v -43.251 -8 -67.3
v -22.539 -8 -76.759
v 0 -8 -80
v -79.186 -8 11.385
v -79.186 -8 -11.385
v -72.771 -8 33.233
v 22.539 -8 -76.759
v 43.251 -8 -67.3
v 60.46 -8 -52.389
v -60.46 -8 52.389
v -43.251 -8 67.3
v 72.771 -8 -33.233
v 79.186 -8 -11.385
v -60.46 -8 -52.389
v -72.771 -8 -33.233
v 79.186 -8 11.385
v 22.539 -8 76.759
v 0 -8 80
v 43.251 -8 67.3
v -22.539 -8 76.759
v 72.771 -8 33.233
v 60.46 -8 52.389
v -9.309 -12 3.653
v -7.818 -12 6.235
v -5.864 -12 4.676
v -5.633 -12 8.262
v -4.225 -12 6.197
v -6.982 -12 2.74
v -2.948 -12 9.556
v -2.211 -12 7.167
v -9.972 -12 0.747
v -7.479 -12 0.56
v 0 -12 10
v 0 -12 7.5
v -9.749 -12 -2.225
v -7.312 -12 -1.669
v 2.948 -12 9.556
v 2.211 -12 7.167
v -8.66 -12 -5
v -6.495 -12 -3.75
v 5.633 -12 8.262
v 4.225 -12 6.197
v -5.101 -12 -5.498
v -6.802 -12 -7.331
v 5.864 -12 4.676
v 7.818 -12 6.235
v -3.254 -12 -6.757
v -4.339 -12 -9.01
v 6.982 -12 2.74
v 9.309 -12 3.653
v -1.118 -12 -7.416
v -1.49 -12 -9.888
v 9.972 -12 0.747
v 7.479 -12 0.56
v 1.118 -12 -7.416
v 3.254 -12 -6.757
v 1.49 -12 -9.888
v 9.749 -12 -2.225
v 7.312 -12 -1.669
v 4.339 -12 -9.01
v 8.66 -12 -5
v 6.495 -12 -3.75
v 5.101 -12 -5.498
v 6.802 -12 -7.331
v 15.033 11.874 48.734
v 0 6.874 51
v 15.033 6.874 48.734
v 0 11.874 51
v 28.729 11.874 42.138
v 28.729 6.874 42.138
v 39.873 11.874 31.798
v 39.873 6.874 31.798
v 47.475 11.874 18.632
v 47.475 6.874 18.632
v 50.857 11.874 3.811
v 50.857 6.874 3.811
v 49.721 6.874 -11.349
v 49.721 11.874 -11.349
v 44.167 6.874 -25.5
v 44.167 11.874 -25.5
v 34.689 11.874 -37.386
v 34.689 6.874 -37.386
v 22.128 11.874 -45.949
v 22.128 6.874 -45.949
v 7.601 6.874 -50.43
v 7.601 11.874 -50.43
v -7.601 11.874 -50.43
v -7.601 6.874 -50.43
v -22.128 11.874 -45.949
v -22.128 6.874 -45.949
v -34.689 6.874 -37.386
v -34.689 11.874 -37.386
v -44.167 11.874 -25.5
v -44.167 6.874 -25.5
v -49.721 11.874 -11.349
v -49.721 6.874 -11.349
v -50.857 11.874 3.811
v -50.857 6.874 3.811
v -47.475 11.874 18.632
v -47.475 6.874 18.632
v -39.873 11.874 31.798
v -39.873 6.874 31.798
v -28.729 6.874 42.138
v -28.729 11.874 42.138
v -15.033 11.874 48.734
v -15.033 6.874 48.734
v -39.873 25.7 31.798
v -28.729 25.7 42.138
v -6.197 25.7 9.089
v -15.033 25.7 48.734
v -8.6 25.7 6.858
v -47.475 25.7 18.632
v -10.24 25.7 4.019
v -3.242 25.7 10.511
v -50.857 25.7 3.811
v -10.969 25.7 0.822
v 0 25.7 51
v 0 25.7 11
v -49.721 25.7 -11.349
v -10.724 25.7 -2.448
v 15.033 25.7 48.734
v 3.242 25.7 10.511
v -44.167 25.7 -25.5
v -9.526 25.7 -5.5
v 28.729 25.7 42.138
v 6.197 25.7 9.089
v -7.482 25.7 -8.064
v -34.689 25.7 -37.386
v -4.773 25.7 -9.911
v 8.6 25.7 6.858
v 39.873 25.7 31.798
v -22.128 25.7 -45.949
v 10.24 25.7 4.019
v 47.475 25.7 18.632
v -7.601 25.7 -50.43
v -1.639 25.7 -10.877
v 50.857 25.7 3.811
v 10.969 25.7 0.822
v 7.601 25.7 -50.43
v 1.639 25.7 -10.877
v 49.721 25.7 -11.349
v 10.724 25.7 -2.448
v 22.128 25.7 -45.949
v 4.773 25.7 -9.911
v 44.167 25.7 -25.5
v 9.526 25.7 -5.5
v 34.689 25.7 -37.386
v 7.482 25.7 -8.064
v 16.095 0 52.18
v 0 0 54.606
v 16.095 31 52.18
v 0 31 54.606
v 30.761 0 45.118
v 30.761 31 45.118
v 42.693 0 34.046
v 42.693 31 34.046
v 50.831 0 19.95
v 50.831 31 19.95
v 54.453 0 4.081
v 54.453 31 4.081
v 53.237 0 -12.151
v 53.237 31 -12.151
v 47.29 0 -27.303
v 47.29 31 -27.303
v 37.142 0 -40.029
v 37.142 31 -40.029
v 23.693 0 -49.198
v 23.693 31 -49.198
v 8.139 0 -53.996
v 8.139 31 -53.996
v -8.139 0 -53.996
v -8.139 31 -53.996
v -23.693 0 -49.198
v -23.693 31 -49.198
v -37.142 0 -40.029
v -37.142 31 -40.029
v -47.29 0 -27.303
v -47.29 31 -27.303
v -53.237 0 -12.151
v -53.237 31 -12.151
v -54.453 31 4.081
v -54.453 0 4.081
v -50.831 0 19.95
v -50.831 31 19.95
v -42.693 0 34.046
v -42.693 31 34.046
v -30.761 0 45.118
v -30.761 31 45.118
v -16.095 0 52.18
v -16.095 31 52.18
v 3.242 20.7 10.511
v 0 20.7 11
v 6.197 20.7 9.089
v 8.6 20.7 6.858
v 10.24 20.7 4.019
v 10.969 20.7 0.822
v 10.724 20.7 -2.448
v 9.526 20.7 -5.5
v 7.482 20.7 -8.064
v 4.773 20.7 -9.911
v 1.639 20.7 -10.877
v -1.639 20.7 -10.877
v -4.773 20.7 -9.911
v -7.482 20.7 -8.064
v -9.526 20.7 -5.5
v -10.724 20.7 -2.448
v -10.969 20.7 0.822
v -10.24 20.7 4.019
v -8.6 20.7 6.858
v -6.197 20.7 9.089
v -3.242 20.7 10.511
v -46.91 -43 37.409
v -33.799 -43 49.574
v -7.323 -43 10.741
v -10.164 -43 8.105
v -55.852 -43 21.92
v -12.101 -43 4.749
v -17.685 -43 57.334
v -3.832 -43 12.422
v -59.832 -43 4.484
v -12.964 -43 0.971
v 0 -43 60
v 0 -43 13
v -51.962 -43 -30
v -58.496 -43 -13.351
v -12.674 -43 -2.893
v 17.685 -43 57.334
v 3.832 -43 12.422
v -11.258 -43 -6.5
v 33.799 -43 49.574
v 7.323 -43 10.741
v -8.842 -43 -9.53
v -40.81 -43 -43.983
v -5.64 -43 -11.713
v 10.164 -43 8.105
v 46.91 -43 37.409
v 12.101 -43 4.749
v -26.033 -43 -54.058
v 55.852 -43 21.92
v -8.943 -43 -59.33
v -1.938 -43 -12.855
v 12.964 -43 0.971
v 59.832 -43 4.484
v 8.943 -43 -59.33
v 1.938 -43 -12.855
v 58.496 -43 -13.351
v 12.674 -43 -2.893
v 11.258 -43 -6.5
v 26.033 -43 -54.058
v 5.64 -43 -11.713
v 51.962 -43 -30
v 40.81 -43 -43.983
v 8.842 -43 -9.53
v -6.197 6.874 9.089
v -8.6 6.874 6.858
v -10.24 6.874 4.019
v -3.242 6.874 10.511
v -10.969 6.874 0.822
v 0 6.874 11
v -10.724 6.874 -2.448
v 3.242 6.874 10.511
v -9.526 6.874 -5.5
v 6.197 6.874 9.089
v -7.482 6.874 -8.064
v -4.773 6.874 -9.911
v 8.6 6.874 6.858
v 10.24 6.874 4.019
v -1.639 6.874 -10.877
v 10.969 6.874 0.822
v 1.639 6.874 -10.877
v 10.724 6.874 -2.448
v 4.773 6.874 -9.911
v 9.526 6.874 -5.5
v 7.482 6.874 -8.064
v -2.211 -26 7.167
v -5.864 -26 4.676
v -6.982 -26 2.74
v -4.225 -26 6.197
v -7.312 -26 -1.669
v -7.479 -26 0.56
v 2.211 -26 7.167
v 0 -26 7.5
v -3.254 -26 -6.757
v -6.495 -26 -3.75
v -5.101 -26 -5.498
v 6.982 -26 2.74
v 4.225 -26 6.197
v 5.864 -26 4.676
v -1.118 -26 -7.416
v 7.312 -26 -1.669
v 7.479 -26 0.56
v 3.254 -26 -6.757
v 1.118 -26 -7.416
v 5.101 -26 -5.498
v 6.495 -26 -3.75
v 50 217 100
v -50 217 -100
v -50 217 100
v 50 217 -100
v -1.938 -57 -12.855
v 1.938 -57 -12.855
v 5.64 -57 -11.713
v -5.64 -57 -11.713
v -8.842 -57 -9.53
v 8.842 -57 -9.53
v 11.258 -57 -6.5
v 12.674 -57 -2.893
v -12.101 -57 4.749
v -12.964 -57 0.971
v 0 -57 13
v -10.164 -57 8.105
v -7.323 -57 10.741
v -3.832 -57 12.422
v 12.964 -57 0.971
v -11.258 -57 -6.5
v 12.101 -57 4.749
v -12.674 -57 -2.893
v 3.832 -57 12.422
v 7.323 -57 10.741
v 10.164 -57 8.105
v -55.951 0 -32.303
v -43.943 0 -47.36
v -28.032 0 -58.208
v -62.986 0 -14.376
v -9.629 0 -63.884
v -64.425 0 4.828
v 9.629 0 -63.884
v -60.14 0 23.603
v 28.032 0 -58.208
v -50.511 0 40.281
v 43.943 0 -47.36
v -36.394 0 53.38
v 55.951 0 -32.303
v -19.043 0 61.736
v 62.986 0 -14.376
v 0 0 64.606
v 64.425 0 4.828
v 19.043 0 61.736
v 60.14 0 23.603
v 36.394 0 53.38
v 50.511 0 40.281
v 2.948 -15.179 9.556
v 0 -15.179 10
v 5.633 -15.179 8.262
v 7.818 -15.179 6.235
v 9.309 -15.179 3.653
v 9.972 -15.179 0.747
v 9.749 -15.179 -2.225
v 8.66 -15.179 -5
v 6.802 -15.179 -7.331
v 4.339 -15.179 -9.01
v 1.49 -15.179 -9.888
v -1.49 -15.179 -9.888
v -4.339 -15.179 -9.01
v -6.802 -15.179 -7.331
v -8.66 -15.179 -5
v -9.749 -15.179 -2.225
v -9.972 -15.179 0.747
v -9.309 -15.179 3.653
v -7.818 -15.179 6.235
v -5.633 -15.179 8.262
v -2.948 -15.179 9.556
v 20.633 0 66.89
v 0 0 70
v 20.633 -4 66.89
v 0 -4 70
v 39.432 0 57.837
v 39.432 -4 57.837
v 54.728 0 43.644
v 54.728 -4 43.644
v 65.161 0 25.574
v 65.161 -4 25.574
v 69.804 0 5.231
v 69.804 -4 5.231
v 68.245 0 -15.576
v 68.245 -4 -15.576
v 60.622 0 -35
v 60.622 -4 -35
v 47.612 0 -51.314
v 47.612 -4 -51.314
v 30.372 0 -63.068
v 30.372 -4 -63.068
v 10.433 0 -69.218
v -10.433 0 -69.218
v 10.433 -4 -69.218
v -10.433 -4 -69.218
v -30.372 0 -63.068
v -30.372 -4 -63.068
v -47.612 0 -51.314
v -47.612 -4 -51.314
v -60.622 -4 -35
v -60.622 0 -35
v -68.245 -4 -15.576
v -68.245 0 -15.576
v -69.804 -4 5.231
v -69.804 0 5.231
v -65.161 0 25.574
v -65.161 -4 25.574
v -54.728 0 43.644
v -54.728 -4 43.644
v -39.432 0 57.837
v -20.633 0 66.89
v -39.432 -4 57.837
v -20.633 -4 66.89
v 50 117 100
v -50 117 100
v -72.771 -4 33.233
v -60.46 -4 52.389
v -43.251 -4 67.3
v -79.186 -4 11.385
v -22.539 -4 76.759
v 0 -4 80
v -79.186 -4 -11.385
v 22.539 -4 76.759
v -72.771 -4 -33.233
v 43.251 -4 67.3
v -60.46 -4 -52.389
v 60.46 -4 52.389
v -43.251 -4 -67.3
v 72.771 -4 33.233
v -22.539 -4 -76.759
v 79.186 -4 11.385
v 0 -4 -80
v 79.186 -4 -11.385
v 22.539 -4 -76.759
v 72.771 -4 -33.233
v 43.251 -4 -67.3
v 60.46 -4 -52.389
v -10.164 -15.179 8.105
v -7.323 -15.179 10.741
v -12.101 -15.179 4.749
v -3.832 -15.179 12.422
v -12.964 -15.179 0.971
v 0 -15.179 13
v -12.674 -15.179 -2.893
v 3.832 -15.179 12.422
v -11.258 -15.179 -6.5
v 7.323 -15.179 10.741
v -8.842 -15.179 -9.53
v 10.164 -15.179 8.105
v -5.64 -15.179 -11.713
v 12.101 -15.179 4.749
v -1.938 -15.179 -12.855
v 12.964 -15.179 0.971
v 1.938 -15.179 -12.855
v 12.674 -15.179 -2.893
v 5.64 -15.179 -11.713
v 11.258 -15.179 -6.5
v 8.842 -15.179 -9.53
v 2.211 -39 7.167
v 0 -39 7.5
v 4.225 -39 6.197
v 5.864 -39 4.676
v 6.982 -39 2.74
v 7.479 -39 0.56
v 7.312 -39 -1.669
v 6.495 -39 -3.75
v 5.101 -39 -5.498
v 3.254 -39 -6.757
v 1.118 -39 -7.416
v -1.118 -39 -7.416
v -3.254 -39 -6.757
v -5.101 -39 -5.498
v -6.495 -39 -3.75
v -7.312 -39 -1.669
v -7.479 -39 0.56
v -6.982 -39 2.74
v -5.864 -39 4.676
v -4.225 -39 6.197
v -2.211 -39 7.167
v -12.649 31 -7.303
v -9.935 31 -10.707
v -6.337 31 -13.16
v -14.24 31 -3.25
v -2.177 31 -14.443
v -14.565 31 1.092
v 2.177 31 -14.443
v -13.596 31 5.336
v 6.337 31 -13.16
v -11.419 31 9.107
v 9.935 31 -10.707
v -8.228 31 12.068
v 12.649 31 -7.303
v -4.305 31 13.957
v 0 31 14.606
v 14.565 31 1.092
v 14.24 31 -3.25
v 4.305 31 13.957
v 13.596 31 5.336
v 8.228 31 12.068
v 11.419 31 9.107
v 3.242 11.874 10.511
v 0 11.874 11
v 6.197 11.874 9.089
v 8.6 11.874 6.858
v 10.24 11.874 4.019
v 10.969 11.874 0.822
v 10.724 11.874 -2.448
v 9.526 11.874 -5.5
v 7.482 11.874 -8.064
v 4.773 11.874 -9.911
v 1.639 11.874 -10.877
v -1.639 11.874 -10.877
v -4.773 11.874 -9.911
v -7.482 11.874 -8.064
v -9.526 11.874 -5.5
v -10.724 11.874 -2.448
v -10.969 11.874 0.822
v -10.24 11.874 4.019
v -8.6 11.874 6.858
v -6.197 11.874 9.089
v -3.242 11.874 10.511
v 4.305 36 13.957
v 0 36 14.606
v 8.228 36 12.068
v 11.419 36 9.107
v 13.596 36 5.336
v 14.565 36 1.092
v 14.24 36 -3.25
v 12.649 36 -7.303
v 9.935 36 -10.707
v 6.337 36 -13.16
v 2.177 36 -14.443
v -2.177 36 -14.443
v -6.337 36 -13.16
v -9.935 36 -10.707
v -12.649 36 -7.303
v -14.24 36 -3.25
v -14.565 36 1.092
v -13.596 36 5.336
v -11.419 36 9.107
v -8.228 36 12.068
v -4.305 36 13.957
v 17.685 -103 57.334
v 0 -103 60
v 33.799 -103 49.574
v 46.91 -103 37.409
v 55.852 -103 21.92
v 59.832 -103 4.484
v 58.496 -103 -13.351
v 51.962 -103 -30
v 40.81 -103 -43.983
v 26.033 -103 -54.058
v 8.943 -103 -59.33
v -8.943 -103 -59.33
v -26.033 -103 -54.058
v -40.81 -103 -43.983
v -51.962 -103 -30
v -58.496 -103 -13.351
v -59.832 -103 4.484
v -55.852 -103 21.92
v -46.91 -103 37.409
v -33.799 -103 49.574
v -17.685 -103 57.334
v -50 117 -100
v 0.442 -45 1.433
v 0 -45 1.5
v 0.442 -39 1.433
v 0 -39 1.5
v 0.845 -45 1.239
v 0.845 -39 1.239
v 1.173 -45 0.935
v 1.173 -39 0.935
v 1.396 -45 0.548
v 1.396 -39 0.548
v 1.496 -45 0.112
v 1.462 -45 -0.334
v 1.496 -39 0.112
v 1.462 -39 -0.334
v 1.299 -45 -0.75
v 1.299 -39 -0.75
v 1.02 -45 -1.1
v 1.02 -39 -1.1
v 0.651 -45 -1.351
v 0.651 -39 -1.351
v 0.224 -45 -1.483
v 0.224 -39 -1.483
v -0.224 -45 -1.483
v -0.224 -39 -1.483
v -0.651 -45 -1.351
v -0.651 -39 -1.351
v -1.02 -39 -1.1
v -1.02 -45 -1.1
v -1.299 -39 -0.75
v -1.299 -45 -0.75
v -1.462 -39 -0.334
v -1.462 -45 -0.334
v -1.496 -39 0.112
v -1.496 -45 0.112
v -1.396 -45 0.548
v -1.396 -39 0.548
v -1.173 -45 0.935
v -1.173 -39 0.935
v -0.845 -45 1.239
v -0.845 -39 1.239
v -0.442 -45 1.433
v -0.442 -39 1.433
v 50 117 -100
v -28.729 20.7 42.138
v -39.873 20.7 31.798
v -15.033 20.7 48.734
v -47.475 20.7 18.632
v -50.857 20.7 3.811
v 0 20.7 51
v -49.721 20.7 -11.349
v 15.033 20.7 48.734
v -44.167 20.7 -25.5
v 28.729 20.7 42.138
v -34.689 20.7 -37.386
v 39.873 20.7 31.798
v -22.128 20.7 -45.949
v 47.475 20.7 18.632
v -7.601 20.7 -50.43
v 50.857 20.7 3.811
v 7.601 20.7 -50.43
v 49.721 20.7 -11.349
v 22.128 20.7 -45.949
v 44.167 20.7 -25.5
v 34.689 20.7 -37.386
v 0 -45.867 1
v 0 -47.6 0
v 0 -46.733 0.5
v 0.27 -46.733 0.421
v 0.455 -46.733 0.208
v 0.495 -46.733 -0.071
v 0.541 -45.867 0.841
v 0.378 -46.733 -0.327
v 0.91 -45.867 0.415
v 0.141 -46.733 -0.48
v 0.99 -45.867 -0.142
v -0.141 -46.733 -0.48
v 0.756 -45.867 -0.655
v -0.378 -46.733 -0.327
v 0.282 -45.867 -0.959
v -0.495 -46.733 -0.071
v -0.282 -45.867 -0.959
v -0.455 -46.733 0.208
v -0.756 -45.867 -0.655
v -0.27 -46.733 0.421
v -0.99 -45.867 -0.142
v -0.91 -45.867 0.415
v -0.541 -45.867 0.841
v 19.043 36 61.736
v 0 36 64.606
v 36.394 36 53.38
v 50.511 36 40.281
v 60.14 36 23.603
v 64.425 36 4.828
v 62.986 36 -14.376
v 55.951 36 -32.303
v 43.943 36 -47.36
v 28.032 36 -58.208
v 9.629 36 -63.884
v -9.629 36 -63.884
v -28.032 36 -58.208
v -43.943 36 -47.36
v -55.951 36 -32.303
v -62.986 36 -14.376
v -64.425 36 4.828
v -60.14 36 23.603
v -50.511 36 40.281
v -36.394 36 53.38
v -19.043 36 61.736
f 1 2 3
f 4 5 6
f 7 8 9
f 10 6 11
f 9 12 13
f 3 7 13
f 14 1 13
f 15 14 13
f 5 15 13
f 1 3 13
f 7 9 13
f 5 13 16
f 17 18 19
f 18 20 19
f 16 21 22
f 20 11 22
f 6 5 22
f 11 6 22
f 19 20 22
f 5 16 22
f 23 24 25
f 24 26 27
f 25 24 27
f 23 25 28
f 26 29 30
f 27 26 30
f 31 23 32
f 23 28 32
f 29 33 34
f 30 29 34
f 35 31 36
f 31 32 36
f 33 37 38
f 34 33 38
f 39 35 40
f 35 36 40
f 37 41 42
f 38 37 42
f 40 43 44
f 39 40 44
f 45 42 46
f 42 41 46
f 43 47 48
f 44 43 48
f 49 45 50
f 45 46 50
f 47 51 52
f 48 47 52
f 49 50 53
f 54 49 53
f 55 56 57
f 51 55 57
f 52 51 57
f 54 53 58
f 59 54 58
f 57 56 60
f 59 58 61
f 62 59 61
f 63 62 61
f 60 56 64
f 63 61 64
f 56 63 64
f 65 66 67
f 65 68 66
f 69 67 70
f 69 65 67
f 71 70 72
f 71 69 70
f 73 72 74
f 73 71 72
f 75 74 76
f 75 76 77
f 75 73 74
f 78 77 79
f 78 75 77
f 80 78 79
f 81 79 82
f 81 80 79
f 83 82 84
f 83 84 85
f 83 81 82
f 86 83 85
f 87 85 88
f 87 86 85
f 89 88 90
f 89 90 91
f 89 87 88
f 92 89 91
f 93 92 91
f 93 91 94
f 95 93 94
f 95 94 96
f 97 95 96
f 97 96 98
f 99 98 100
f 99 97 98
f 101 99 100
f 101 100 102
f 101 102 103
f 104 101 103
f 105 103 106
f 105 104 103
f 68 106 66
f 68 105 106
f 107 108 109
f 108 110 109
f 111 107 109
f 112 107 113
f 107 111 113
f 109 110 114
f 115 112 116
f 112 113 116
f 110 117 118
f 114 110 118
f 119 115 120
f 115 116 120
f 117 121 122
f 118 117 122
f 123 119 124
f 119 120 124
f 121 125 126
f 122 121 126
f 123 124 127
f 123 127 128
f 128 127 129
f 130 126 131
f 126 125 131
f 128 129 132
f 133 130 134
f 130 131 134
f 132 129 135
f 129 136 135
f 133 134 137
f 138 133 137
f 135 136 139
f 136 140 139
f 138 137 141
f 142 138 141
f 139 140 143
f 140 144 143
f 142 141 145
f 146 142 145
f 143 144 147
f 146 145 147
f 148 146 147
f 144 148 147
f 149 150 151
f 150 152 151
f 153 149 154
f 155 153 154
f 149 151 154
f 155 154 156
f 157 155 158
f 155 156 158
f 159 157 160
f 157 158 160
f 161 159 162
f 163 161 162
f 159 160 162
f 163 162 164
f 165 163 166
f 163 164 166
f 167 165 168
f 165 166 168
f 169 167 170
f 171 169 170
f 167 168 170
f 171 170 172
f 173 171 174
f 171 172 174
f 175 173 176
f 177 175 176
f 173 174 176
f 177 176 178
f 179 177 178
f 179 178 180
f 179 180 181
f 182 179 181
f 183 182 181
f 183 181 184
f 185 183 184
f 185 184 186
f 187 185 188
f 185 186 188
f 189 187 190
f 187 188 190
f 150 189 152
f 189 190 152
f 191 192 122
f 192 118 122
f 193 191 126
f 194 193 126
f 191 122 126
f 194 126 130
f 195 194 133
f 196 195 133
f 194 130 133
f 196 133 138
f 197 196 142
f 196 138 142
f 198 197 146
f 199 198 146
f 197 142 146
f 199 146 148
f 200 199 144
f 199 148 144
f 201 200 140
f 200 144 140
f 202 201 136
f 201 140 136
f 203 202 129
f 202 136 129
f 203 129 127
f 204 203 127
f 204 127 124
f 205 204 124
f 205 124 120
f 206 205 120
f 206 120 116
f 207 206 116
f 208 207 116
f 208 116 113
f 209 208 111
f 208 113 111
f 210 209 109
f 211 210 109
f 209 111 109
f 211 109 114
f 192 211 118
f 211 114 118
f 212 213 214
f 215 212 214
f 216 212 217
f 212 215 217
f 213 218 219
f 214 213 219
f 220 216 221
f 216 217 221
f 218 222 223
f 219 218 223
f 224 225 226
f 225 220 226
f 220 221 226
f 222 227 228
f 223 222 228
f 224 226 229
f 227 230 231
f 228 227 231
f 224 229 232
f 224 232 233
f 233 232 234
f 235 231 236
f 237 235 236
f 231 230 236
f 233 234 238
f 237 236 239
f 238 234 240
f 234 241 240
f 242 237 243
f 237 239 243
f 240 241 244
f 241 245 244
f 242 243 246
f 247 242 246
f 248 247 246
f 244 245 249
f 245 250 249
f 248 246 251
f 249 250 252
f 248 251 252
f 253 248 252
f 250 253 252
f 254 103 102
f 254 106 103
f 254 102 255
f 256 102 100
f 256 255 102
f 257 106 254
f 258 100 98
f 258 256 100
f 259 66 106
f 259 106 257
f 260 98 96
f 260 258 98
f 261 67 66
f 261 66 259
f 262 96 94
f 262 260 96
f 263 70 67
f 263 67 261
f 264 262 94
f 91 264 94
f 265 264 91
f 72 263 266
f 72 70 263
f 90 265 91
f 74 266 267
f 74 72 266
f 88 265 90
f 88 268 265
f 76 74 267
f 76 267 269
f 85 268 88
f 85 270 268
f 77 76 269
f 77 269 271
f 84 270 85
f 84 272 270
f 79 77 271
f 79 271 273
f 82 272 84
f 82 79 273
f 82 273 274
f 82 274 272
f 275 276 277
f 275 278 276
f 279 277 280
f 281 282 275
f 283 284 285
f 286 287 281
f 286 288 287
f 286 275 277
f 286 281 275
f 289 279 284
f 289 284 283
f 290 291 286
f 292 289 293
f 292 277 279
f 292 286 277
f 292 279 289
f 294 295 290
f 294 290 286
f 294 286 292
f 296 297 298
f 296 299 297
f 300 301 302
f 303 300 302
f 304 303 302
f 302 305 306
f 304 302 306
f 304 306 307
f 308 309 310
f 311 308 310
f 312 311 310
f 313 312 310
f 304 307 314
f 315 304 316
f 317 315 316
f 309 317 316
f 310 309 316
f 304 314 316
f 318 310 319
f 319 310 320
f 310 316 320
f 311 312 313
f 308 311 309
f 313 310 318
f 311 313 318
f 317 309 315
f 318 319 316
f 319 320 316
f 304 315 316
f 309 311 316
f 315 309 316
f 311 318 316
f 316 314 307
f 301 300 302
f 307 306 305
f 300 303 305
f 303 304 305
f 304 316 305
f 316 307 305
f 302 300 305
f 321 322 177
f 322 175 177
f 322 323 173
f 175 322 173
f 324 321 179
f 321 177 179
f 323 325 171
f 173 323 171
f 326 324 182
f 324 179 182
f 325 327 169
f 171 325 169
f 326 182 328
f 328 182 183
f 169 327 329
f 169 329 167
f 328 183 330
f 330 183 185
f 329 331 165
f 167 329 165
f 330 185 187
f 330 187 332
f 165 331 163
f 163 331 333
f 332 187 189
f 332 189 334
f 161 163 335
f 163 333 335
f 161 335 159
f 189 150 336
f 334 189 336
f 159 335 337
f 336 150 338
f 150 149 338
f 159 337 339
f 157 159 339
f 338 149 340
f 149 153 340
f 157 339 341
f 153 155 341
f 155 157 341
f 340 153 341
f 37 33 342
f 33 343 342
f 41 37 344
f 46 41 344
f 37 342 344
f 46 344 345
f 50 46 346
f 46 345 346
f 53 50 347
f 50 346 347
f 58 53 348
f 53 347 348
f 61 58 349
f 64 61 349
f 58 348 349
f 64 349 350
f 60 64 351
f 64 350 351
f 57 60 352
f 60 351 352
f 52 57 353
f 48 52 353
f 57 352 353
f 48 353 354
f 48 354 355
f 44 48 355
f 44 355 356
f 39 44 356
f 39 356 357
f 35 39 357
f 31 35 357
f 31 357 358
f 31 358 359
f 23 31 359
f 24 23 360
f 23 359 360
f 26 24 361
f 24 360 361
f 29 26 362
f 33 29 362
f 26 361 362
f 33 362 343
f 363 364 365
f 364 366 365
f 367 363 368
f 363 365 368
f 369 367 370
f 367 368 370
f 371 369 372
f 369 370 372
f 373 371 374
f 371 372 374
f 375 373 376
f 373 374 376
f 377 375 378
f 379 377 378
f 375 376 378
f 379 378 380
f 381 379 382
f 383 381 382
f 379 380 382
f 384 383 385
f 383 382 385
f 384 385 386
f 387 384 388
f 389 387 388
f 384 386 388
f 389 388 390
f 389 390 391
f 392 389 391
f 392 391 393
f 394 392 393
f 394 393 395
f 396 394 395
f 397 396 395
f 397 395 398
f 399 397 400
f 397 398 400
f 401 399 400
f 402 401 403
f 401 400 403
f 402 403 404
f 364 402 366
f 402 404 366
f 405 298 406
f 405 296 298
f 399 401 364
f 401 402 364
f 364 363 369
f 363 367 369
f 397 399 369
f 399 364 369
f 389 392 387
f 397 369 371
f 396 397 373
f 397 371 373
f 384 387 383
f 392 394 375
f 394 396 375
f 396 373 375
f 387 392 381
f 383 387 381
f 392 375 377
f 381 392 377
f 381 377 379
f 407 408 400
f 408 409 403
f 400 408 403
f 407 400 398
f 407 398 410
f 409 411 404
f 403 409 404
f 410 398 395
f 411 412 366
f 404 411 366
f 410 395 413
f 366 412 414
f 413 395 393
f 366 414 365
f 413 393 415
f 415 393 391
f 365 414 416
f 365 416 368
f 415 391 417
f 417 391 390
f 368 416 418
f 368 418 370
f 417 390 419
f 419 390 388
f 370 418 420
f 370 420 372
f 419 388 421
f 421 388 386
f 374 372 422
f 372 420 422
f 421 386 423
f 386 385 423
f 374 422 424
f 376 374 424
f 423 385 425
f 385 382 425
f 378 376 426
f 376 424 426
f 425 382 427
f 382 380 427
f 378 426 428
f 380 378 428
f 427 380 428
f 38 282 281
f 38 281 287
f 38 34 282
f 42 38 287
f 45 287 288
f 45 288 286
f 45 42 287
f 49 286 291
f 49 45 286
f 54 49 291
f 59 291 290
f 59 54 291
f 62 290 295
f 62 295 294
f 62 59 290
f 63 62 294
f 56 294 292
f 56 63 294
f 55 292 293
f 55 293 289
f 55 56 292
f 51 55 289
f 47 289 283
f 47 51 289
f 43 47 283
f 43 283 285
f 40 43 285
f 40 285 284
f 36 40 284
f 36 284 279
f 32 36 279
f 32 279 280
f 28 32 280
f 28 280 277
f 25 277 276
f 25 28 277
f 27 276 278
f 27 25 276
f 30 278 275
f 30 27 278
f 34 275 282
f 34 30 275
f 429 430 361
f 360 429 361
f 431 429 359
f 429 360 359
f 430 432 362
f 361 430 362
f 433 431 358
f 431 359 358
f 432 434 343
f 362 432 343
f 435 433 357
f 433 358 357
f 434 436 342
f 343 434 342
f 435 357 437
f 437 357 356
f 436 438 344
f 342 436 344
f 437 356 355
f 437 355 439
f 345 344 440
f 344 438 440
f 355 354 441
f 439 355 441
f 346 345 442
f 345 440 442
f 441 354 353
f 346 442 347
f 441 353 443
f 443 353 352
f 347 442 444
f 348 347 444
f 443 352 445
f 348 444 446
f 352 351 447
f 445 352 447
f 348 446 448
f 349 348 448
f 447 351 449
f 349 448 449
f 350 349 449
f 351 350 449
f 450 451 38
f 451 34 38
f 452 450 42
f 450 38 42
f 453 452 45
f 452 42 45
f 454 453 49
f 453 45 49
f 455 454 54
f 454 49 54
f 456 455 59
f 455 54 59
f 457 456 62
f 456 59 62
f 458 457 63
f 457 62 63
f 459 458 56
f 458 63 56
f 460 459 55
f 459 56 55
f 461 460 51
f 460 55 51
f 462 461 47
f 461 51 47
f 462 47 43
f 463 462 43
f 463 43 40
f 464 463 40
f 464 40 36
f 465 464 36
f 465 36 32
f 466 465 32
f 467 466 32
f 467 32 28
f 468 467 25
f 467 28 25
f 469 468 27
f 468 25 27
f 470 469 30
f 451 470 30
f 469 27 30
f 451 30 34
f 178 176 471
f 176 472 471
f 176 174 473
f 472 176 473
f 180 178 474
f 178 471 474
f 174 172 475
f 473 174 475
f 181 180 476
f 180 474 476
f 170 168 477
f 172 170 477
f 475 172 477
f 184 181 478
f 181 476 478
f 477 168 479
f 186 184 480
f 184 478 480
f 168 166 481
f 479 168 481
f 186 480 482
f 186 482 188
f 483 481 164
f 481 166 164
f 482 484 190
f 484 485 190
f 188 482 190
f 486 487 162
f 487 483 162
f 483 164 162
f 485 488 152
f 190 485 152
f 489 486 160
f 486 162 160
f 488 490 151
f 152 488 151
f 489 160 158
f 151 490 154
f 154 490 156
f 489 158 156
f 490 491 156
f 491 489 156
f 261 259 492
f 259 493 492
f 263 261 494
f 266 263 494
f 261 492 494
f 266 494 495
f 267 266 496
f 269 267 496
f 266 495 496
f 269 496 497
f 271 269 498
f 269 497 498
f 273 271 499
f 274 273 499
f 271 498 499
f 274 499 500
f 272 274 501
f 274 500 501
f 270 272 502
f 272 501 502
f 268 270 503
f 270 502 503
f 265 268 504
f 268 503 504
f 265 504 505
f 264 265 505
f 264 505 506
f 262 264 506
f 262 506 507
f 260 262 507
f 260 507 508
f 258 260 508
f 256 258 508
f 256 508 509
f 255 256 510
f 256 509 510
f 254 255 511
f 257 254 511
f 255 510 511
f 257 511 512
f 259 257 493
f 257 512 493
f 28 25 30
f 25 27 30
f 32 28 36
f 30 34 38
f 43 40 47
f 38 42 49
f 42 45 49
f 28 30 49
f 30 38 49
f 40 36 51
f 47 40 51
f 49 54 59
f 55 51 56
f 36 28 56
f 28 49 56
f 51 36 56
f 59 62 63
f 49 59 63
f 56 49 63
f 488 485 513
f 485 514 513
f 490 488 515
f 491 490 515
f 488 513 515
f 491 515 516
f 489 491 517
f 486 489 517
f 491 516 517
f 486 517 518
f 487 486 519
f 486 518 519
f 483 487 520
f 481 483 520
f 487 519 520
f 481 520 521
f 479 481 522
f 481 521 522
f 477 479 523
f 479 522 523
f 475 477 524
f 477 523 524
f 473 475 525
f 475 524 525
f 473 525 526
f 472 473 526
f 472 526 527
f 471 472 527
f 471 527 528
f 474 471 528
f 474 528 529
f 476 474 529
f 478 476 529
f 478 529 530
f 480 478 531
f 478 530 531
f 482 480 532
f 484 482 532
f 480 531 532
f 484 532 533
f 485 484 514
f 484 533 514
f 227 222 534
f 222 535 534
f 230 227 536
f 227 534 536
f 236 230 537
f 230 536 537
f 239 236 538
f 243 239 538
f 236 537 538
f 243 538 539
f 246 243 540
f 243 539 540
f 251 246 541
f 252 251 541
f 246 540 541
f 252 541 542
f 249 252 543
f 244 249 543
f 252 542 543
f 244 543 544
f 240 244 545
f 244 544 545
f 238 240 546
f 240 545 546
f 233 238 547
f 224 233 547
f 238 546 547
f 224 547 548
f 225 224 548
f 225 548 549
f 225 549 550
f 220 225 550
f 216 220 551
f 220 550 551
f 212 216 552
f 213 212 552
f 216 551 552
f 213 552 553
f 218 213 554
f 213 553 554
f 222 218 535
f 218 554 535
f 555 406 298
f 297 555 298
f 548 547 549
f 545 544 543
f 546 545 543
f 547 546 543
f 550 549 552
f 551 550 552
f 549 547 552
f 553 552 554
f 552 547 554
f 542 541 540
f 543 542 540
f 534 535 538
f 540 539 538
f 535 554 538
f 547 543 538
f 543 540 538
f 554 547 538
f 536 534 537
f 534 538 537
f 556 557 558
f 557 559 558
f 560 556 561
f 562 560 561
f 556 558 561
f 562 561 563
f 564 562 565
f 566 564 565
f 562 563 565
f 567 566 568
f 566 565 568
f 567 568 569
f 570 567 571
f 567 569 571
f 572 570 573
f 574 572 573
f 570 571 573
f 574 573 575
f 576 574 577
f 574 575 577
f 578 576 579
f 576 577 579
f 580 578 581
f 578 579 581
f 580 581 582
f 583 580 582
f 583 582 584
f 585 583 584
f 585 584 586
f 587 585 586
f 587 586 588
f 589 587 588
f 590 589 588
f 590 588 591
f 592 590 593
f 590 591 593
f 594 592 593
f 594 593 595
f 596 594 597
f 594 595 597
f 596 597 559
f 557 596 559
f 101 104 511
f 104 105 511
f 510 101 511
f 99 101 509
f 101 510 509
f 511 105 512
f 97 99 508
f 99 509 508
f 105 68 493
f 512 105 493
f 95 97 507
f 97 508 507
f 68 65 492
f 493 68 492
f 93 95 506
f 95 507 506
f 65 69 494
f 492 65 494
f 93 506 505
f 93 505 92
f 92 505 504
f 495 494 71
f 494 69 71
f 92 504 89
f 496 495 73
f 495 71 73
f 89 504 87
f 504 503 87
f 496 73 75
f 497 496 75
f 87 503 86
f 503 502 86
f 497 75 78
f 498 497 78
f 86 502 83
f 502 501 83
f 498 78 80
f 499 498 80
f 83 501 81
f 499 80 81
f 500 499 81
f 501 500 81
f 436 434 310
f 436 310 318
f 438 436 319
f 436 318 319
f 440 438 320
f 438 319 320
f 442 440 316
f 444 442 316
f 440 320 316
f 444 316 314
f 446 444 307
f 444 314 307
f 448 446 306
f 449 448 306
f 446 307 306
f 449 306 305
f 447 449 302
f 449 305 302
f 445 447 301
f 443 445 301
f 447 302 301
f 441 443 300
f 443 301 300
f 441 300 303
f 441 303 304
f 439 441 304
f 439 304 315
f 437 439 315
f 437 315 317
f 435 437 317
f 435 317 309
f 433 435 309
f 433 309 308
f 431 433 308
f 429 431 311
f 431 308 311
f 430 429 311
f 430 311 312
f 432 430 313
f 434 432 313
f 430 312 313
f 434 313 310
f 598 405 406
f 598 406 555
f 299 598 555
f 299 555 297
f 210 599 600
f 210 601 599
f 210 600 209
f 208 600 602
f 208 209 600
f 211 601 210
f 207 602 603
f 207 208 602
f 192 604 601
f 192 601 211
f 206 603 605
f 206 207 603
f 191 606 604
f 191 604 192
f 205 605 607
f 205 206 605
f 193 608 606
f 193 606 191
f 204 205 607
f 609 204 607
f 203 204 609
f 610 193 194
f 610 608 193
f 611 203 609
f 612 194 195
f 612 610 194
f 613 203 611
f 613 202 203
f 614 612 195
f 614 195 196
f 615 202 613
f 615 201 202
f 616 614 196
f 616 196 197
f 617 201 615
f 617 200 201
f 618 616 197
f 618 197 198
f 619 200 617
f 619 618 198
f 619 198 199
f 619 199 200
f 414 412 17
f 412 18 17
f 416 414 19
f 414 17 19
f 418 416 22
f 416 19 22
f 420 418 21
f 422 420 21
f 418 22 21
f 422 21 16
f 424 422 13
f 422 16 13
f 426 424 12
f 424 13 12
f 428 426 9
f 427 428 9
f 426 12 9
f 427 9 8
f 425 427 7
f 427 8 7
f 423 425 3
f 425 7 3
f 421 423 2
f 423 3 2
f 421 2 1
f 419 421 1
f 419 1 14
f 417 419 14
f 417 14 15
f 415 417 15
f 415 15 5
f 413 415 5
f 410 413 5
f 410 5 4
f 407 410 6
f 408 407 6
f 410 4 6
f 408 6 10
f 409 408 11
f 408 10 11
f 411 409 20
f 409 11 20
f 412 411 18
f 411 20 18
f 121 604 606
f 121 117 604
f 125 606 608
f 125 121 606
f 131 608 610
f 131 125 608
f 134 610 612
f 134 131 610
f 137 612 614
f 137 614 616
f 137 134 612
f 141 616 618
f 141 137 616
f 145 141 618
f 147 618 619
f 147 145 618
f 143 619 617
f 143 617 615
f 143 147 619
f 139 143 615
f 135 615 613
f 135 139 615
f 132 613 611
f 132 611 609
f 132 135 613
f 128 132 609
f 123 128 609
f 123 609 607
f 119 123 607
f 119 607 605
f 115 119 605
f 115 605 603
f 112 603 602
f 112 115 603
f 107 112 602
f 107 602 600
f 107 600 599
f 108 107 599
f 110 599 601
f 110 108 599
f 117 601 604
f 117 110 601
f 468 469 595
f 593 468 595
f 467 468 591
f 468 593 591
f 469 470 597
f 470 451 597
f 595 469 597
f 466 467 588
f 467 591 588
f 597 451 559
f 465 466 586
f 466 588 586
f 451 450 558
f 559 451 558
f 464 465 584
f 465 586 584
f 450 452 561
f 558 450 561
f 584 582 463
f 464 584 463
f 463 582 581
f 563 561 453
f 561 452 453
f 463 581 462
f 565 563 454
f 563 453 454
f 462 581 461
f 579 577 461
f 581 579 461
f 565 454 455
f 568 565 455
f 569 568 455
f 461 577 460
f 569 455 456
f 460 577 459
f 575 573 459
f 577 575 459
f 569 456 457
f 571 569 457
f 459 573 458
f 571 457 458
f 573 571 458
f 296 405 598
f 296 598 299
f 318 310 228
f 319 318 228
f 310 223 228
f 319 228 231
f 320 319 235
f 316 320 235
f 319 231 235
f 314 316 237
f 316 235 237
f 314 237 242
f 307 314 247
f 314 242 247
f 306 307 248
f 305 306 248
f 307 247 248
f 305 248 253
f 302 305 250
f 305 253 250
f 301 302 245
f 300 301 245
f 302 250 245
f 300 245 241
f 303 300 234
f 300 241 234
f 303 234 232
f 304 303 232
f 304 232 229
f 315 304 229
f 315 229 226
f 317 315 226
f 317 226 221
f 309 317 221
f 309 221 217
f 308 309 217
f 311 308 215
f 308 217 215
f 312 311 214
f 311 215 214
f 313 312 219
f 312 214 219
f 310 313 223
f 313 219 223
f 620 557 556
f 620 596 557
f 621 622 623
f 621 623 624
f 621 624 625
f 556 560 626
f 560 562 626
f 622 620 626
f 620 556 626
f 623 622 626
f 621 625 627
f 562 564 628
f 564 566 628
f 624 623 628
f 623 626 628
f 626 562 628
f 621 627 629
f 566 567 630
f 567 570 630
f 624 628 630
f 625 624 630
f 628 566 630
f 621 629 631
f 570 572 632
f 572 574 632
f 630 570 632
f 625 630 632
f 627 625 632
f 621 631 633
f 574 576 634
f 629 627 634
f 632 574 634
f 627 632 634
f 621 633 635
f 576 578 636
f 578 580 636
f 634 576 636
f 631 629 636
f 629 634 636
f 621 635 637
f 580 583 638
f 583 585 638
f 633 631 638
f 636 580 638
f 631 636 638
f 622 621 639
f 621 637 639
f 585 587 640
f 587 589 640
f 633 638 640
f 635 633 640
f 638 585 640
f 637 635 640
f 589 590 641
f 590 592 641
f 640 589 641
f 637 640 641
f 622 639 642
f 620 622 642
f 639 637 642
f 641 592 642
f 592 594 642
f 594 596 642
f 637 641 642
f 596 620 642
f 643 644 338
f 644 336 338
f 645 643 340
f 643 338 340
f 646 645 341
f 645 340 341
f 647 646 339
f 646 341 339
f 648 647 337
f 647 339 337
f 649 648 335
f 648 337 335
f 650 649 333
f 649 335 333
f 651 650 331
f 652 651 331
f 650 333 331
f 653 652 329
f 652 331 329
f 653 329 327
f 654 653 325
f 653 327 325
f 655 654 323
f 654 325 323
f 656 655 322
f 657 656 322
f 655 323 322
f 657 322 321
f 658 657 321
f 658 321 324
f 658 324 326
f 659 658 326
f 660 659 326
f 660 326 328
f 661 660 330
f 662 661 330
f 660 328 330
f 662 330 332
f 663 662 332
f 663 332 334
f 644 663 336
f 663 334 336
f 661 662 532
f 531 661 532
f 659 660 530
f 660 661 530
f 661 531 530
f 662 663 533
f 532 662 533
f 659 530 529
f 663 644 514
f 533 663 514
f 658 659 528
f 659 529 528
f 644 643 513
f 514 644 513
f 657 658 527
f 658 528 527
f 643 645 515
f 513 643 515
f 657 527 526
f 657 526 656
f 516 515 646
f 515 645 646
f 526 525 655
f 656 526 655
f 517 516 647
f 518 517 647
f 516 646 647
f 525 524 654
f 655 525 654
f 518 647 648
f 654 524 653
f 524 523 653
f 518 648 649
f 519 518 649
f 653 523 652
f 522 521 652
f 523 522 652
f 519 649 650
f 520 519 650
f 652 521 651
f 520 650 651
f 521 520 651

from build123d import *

# Parameters (mm, degrees)
F1_DEPTH = 50
F0_W     = 14
F0_H     = 7.5
F0_W_2   = 5
F0_H_2   = 40


with BuildPart() as f1:
    # F0 (on Right) → F1 (new body, symmetric)
    with BuildSketch(Plane.YZ):
        Polygon((217, 100), (117, 100), (117, 0), (117, -100), (217, -100), align=None)
    extrude(amount=F1_DEPTH, both=True)


with BuildPart() as f2:
    # F0 (on Right) → F2 (revolve)
    with BuildSketch(Plane.YZ):
        Polygon((0, 64.6060726047), (0, 54.6060726047), (31, 54.6060726047), (31, 14.6060726047), (36, 14.6060726047), (36, 54.6060726047), (36, 64.6060726047), align=None)
    revolve(axis=Axis((0, 11.2299398184, 0), (0, 1, 0)))


with BuildPart() as f3:
    # F0 (on Right) → F3 (revolve)
    with BuildSketch(Plane.YZ):
        Polygon((-8, 0), (0, 0), (0, 54.6060726047), (0, 64.6060726047), (0, 70), (-4, 70), (-4, 80), (-8, 80), align=None)
    revolve(axis=Axis((0, 11.2299398184, 0), (0, 1, 0)))


with BuildPart() as f4:
    # F0 (on Right) → F4 (revolve)
    with BuildSketch(Plane.YZ):
        with Locations((-19, 3.75)):
            Rectangle(F0_W, F0_H)
    revolve(axis=Axis((0, 11.2299398184, 0), (0, 1, 0)))


with BuildPart() as f5:
    # F0 (on Right) → F5 (revolve)
    with BuildSketch(Plane.YZ):
        Polygon((-26, 7.5), (-12, 7.5), (-12, 10), (-15.1788335517, 10), (-15.1788335517, 13), (-43, 13), (-57, 13), (-57, 0), (-47.6, 0), (-45, 1.5), (-39, 1.5), (-39, 7.5), align=None)
    revolve(axis=Axis((0, 11.2299398184, 0), (0, 1, 0)))


with BuildPart() as f6:
    # F0 (on Right) → F6 (revolve)
    with BuildSketch(Plane.YZ):
        Polygon((-103, 0), (-57, 0), (-57, 13), (-43, 13), (-43, 60), (-103, 60), align=None)
    revolve(axis=Axis((0, 11.2299398184, 0), (0, 1, 0)))


with BuildPart() as f7:
    # F0 (on Right) → F7 (revolve)
    with BuildSketch(Plane.YZ):
        with Locations((9.3741726726, 31)):
            Rectangle(F0_W_2, F0_H_2)
    revolve(axis=Axis((0, 11.2299398184, 0), (0, 1, 0)))


with BuildPart() as f8:
    # F0 (on Right) → F8 (revolve)
    with BuildSketch(Plane.YZ):
        with Locations((23.2, 31)):
            Rectangle(F0_W_2, F0_H_2)
    revolve(axis=Axis((0, 11.2299398184, 0), (0, 1, 0)))


solid = Compound([f1.part, f2.part, f3.part, f4.part, f5.part, f6.part, f7.part, f8.part])
